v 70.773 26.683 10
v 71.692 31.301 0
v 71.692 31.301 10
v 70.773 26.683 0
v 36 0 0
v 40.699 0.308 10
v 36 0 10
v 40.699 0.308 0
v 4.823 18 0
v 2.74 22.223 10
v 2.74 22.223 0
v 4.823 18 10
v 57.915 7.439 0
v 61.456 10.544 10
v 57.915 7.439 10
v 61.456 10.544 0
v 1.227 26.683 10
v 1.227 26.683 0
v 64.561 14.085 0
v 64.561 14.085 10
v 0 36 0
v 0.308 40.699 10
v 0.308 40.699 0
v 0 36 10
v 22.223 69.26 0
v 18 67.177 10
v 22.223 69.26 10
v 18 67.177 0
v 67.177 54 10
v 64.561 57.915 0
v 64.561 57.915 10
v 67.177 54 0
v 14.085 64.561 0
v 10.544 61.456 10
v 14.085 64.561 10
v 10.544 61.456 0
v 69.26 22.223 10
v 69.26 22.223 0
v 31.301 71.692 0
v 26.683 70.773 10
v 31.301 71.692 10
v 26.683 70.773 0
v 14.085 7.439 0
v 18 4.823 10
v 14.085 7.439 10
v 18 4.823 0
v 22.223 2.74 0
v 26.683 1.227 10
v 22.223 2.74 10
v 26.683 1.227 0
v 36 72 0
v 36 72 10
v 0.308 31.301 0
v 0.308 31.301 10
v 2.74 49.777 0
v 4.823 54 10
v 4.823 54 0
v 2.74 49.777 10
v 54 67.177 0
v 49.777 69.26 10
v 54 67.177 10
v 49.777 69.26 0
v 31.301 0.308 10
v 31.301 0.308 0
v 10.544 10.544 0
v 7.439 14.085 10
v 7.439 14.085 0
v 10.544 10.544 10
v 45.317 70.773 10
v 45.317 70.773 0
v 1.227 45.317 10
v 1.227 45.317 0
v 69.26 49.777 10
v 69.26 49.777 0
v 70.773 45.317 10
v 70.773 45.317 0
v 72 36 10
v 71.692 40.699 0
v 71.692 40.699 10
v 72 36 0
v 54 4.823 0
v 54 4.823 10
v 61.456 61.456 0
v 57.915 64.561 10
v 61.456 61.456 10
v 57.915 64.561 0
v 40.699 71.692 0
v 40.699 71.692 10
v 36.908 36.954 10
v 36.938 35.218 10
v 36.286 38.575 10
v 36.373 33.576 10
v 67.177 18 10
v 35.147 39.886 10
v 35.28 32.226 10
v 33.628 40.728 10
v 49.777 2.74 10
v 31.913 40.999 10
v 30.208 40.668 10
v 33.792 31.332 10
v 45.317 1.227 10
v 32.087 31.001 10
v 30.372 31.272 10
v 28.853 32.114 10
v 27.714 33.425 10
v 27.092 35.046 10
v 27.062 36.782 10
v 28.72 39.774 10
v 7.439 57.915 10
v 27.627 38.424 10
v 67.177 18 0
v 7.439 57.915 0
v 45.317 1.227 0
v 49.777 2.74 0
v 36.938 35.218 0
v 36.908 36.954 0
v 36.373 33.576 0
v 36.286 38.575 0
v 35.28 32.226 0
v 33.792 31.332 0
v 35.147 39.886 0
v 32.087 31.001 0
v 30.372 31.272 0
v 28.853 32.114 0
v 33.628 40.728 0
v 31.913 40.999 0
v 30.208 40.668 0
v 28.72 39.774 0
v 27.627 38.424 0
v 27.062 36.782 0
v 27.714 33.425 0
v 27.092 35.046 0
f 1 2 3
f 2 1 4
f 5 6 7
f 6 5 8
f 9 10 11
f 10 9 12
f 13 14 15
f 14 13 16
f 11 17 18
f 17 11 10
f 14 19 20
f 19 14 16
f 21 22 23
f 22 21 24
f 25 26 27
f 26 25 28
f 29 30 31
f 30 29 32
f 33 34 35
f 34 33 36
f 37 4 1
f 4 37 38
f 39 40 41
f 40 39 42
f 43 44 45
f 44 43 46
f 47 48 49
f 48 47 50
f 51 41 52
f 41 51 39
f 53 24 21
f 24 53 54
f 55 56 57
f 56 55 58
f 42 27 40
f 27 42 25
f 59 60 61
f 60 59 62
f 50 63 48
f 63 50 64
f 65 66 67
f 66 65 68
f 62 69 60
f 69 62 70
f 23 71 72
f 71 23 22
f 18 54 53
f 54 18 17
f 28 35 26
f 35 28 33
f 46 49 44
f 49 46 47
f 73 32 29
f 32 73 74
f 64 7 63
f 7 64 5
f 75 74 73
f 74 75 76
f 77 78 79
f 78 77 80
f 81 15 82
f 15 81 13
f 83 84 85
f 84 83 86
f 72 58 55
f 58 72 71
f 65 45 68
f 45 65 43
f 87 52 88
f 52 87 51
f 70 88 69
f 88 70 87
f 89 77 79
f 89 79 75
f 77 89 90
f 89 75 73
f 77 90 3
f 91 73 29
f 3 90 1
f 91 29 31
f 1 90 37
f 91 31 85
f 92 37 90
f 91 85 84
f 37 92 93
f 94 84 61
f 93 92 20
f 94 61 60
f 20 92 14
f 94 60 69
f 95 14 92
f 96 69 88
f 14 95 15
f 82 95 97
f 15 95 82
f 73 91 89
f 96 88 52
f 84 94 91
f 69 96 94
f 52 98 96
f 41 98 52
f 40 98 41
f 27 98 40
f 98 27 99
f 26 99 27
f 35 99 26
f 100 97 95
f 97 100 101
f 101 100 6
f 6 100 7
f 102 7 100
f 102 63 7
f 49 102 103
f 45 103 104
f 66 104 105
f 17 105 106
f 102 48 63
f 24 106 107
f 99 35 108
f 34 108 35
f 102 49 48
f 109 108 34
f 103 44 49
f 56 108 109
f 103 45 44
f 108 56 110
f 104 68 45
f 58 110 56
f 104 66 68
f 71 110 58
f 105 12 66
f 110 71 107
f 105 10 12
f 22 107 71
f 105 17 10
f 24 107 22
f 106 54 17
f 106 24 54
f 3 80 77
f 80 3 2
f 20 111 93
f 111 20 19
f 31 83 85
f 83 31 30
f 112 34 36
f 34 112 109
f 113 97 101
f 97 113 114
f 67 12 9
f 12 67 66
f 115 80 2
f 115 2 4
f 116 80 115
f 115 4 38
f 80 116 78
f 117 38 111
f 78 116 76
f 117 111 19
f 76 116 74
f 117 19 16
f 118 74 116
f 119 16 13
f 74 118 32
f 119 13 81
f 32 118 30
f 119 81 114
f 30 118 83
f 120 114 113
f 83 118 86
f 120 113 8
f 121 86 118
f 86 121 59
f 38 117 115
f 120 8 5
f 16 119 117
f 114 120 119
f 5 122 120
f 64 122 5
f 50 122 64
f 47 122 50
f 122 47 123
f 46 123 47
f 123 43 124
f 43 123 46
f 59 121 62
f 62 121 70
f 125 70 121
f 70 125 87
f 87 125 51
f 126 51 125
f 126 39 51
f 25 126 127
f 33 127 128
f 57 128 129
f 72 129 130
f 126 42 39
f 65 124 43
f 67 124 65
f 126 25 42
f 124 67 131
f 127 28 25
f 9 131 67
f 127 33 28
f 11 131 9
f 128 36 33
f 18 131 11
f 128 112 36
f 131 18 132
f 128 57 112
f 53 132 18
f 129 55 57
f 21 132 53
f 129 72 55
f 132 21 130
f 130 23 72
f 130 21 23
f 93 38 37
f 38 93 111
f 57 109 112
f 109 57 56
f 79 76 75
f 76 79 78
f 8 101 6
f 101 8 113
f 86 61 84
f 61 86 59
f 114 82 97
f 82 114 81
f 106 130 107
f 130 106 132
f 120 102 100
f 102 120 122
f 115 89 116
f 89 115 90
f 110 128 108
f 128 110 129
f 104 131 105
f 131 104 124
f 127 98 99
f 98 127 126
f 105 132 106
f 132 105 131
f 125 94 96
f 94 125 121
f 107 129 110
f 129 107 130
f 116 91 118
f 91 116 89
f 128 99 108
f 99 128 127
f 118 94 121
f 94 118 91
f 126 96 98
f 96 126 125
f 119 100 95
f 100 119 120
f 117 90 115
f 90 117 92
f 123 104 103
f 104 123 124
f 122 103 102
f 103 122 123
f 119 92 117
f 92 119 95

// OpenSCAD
$fn = 32;

// ----------------------------------------------------------------------
// Cam plate: eccentric cam, base R36
// ----------------------------------------------------------------------

// --- parameters (mm) ---
base_r = 36;              // base circle radius
lobe_h = 8;               // cam lobe rise
bore_r = 5;               // shaft bore radius
plate_t = 10;             // plate thickness, Z (extrusion height)
ecc = 4;                  // disc eccentricity

profile = [[72, 36], [71.692, 40.699], [70.773, 45.317], [69.26, 49.777], [67.177, 54], [64.561, 57.915], [61.456, 61.456], [57.915, 64.561], [54, 67.177], [49.777, 69.26], [45.317, 70.773], [40.699, 71.692], [36, 72], [31.301, 71.692], [26.683, 70.773], [22.223, 69.26], [18, 67.177], [14.085, 64.561], [10.544, 61.456], [7.439, 57.915], [4.823, 54], [2.74, 49.777], [1.227, 45.317], [0.308, 40.699], [0, 36], [0.308, 31.301], [1.227, 26.683], [2.74, 22.223], [4.823, 18], [7.439, 14.085], [10.544, 10.544], [14.085, 7.439], [18, 4.823], [22.223, 2.74], [26.683, 1.227], [31.301, 0.308], [36, 0], [40.699, 0.308], [45.317, 1.227], [49.777, 2.74], [54, 4.823], [57.915, 7.439], [61.456, 10.544], [64.561, 14.085], [67.177, 18], [69.26, 22.223], [70.773, 26.683], [71.692, 31.301]];  // primary outline, 48 points, counter clockwise
void_1 = [[36.908, 36.954], [36.286, 38.575], [35.147, 39.886], [33.628, 40.728], [31.913, 40.999], [30.208, 40.668], [28.72, 39.774], [27.627, 38.424], [27.062, 36.782], [27.092, 35.046], [27.714, 33.425], [28.853, 32.114], [30.372, 31.272], [32.087, 31.001], [33.792, 31.332], [35.28, 32.226], [36.373, 33.576], [36.938, 35.218]];  // shaft bore, 18 points

// --- the one profile operation ---
difference() {
  linear_extrude(height = plate_t) polygon(points = profile);
  translate([0, 0, -1])
    linear_extrude(height = plate_t + 2) polygon(points = void_1);
}
